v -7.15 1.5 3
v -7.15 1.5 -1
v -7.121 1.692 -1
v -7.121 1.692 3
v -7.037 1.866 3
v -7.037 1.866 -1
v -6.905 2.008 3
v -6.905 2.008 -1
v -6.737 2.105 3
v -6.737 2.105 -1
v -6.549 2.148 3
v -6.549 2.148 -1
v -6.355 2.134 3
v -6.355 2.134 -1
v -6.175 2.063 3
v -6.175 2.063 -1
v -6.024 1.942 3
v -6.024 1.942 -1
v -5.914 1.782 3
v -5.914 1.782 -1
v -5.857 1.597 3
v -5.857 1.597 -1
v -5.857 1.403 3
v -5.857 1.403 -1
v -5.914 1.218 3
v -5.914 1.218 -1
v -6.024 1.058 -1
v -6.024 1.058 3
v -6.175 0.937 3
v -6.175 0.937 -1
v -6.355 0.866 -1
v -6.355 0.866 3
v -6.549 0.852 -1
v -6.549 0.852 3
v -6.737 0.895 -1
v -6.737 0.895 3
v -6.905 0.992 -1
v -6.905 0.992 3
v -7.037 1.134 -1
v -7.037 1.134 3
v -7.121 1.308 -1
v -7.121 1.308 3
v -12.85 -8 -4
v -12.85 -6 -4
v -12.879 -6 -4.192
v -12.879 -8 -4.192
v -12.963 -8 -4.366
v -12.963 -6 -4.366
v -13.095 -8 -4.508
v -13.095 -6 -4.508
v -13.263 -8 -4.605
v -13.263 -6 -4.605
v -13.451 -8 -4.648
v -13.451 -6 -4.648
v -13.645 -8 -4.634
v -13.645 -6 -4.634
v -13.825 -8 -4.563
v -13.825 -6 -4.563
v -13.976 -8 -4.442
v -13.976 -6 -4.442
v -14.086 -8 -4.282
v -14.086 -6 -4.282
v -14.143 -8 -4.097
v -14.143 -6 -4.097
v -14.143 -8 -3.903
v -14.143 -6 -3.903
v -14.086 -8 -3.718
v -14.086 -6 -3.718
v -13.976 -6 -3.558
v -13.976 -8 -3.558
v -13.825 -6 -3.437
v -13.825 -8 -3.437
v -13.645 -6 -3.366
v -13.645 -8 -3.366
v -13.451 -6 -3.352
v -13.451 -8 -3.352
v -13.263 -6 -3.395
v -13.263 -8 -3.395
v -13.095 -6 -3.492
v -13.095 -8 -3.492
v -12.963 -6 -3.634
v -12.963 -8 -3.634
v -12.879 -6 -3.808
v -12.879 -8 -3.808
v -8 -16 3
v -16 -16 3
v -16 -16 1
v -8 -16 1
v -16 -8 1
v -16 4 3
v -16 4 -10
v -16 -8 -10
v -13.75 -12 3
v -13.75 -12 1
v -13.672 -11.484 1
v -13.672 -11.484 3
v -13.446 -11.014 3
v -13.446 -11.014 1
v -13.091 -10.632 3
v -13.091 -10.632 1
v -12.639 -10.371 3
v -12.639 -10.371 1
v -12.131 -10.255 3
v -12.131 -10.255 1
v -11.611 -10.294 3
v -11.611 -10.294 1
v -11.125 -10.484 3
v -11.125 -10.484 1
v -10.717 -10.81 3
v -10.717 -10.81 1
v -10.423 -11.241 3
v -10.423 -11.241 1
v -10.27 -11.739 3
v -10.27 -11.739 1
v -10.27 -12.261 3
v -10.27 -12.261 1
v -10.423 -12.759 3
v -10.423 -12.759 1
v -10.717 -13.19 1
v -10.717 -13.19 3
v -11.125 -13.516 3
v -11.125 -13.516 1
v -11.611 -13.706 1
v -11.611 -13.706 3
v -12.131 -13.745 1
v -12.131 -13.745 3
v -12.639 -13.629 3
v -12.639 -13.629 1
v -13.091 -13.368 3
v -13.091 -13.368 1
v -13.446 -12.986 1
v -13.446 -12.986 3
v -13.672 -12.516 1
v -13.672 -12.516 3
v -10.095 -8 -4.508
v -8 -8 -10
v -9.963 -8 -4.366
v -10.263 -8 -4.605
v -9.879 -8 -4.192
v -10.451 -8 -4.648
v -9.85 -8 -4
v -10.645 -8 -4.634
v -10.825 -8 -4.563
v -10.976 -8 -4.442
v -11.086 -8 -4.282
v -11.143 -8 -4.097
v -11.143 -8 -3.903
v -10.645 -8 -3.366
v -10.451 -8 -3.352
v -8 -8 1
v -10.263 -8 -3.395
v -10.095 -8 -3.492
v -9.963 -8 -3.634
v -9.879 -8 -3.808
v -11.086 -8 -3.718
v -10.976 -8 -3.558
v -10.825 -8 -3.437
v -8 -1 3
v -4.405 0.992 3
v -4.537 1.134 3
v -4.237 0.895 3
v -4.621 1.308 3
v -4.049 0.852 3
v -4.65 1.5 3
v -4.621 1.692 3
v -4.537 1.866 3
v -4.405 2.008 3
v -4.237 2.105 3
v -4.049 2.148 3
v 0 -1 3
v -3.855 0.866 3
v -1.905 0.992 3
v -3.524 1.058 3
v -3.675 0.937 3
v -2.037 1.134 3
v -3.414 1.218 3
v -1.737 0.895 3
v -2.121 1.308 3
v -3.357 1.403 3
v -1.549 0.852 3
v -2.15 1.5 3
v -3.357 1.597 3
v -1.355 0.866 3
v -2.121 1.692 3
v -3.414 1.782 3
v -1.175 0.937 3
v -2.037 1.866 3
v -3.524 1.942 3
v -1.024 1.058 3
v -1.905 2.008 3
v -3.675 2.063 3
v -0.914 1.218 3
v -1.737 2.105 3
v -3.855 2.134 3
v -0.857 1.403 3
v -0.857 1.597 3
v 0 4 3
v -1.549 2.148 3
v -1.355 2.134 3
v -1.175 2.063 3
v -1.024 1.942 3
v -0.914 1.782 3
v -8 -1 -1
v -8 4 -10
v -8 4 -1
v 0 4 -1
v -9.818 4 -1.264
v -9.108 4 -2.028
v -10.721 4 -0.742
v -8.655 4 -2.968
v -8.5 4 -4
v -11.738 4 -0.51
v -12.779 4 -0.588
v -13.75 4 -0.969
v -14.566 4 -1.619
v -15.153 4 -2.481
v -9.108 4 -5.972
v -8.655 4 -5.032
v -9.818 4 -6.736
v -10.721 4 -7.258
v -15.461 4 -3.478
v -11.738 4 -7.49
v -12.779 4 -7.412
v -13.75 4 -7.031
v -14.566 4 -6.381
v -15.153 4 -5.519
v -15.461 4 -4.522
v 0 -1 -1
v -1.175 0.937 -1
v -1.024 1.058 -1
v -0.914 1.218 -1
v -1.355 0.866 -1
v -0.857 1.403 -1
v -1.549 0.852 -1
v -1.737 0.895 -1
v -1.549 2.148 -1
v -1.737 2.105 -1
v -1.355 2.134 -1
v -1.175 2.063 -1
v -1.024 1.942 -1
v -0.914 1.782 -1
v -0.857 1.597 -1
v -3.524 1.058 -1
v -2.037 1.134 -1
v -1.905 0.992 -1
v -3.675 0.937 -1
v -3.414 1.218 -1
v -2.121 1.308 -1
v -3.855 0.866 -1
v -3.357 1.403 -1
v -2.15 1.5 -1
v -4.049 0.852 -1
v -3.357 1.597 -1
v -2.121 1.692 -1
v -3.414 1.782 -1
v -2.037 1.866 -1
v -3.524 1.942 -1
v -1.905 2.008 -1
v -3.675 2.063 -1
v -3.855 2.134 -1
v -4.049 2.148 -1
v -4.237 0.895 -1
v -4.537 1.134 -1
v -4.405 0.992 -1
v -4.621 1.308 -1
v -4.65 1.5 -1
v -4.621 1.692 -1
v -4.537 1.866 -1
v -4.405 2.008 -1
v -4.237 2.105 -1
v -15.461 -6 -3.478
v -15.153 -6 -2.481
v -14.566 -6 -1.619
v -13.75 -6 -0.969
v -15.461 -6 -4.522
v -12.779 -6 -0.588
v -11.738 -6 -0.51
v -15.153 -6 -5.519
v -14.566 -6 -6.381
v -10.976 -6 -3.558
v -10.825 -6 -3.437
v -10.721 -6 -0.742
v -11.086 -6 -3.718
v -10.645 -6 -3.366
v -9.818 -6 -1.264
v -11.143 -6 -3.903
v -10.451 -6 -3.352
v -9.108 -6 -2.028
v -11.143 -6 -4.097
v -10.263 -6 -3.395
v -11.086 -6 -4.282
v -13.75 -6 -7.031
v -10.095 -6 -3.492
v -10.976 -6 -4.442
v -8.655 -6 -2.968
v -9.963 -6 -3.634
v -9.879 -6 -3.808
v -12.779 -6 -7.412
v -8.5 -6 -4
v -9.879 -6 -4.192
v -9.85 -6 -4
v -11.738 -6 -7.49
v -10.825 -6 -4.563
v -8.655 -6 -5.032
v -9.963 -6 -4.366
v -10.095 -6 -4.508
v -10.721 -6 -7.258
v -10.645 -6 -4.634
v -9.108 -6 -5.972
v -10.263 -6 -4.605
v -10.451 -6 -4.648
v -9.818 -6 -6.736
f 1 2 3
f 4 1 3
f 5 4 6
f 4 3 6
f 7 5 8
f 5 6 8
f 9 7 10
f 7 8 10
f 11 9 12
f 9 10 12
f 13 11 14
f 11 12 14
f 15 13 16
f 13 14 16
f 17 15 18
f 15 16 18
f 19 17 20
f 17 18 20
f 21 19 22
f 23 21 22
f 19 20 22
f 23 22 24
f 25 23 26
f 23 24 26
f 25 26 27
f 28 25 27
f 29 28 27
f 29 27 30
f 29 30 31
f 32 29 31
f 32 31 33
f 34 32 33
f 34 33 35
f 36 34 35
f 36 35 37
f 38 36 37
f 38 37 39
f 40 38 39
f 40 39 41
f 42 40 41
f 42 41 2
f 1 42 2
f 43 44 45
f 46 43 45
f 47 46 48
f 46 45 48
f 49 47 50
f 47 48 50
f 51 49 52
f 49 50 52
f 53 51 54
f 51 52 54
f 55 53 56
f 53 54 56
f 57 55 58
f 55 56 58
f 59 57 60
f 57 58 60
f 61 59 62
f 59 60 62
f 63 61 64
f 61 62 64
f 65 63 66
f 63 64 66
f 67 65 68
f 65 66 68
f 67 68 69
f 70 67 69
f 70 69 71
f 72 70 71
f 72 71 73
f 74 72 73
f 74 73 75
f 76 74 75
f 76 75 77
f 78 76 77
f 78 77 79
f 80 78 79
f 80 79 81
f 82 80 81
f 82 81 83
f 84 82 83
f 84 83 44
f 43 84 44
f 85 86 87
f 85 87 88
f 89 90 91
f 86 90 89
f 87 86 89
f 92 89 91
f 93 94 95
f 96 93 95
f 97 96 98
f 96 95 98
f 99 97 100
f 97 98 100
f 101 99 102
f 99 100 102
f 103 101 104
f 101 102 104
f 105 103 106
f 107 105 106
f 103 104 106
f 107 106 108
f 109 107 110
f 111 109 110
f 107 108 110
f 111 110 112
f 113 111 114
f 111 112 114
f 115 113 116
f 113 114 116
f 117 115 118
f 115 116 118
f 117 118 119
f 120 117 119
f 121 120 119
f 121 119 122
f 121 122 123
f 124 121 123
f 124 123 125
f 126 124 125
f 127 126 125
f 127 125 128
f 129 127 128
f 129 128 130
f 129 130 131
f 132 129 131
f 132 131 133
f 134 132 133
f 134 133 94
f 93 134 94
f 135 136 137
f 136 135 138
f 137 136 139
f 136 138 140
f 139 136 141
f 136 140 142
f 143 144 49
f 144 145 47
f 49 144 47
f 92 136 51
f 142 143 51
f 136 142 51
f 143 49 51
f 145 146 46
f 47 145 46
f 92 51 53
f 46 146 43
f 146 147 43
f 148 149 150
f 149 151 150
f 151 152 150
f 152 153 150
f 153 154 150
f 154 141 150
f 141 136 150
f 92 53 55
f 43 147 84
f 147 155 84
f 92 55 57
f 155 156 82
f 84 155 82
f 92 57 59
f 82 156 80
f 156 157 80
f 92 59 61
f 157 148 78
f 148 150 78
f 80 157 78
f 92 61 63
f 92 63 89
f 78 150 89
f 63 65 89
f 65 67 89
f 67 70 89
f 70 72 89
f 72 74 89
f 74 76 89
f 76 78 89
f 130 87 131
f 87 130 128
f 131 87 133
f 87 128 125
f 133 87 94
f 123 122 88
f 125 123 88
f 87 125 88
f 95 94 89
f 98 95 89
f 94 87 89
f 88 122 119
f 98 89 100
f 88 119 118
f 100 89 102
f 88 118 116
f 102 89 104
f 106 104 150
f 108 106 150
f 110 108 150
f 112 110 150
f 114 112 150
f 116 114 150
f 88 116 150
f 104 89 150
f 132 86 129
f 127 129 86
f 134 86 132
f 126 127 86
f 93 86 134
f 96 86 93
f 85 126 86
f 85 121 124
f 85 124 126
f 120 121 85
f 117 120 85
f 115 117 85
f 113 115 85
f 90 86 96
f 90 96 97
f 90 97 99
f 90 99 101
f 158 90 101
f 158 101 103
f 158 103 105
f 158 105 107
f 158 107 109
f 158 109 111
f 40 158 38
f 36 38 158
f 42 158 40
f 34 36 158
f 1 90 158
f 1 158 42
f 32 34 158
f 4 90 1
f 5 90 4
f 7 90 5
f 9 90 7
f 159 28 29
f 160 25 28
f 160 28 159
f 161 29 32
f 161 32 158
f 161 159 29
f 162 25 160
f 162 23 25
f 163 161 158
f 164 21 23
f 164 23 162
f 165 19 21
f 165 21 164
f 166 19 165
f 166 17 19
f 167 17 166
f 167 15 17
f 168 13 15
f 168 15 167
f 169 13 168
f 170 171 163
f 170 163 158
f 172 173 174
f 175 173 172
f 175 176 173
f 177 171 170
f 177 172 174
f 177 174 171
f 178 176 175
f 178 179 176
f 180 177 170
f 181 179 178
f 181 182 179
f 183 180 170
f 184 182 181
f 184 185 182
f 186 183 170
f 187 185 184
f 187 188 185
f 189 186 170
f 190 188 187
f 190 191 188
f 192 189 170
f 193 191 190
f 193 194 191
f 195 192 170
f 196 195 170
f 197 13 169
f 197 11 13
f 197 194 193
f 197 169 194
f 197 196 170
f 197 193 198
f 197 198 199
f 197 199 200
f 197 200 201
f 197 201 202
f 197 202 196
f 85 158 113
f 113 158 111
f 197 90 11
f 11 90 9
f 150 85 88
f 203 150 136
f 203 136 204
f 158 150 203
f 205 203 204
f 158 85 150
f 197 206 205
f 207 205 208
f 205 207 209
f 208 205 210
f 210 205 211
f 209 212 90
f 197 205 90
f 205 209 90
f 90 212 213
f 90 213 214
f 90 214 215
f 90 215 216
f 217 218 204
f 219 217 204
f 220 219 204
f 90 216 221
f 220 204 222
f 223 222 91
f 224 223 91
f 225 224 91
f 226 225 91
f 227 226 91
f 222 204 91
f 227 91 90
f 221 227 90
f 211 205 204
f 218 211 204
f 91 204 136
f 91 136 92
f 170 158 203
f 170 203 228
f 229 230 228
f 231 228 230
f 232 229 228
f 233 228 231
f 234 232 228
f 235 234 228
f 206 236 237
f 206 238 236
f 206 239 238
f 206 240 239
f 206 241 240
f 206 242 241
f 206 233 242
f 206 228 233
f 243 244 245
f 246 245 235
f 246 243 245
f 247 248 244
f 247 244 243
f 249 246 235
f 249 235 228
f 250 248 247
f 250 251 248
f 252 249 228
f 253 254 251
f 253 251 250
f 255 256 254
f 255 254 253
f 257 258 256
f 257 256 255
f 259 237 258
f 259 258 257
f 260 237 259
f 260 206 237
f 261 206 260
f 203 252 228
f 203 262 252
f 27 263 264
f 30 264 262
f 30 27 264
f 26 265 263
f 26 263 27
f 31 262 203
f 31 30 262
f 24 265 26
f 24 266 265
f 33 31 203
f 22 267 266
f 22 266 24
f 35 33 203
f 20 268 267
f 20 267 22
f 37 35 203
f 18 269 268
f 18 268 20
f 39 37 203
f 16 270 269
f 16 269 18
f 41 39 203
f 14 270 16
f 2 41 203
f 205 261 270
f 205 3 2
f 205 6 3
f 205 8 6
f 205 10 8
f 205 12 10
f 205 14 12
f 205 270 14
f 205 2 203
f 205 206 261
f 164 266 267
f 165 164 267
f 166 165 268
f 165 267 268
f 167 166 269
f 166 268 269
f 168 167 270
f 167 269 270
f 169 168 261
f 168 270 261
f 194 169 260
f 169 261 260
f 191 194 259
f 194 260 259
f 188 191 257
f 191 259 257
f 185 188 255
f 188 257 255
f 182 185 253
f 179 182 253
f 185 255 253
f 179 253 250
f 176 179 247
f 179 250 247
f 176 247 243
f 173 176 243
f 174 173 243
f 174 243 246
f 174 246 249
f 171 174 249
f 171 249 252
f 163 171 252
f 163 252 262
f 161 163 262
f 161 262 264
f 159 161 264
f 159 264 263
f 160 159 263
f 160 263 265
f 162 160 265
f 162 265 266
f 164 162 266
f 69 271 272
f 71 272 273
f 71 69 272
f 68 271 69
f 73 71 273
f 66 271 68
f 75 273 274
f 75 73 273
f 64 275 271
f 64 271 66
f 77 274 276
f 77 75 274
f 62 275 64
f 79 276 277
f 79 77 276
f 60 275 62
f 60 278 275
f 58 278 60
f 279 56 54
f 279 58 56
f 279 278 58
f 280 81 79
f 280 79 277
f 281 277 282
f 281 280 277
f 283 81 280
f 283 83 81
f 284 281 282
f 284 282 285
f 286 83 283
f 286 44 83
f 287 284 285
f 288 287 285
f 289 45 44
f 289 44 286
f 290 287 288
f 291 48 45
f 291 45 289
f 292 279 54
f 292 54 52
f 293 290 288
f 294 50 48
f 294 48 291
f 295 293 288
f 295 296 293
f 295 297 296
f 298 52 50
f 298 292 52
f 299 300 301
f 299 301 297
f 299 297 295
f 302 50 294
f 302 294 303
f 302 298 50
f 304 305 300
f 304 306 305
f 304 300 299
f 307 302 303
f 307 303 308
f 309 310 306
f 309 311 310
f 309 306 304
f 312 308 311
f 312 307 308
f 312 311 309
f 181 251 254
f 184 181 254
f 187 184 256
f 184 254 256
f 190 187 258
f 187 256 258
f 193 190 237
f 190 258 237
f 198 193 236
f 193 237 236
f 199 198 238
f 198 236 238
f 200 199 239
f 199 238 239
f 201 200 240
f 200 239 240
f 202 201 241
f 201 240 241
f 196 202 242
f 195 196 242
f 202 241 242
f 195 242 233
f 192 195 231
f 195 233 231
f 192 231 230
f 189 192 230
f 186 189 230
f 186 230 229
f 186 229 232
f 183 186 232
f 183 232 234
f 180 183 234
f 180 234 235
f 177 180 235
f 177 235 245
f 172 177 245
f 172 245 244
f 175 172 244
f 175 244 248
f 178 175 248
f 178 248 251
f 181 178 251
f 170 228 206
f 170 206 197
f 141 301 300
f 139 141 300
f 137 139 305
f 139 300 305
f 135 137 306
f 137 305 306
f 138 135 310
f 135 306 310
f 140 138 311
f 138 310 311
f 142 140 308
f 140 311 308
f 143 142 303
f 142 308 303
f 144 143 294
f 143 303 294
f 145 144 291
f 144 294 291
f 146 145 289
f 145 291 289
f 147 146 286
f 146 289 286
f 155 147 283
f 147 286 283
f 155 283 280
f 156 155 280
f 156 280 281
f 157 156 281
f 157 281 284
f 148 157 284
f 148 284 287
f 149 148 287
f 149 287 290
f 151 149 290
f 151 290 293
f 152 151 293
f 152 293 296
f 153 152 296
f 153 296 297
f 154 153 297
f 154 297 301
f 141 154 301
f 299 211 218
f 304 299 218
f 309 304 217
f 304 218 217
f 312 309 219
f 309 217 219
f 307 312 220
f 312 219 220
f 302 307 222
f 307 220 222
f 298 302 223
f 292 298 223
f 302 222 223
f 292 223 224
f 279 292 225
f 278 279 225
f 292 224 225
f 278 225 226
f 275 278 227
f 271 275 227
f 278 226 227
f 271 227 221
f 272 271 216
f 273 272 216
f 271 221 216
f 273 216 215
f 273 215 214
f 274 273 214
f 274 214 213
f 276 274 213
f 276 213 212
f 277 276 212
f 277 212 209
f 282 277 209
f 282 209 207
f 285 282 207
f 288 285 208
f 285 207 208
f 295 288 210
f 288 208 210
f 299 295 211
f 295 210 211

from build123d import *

# Parameters (mm, degrees)
BOSS_EXTRUDE1_DEPTH  = 2
SKETCH2_W            = 8
SKETCH2_H            = 8
BOSS_EXTRUDE2_DEPTH  = 2
SKETCH3_W            = 8
SKETCH3_H            = 8
BOSS_EXTRUDE3_DEPTH  = 8
SKETCH4_R            = 3.5
CUT_EXTRUDE1_DEPTH   = 10
CUT_EXTRUDE2_REACH   = 4
SKETCH5_R            = 0.65
CUT_EXTRUDE3_REACH   = 3
SKETCH6_R            = 0.65
SKETCH10_R           = 0.65
BOSS_EXTRUDE6_DEPTH  = 3
SKETCH11_W           = 8
SKETCH11_H           = 2
BOSS_EXTRUDE7_DEPTH  = 8
SKETCH12_R           = 1
CUT_EXTRUDE5_DEPTH   = 8
SKETCH13_W           = 8
SKETCH13_H           = 12
BOSS_EXTRUDE8_DEPTH  = 2
SKETCH14_W           = 8
SKETCH14_H           = 4
BOSS_EXTRUDE9_DEPTH  = 1
BOSS_EXTRUDE10_DEPTH = 2
SKETCH18_R           = 0.65
BOSS_EXTRUDE11_DEPTH = 4
CUT_EXTRUDE6_REACH   = 6
SKETCH19_R           = 0.65
CUT_EXTRUDE7_REACH   = 4
SKETCH20_R           = 1.75


with BuildPart() as part:
    # Sketch1 → Boss-Extrude1 (new body)
    with BuildSketch(Plane(origin=(0, 0, 0), x_dir=(1, 0, 0), z_dir=(0, 1, 0))):
        Polygon((-16, 0), (0, 0), (0, 1), (-8, 1), (-8, 8), (-16, 8), align=None)
    extrude(amount=BOSS_EXTRUDE1_DEPTH)

    # Sketch2 → Boss-Extrude2 (add)
    with BuildSketch(Plane(origin=(0, 2, 0), x_dir=(1, 0, 0), z_dir=(0, 1, 0))):
        with Locations((-12, 4)):
            Rectangle(SKETCH2_W, SKETCH2_H)
    extrude(amount=BOSS_EXTRUDE2_DEPTH)

    # Sketch3 → Boss-Extrude3 (add)
    with BuildSketch(Plane.XZ):
        with Locations((-12, -4)):
            Rectangle(SKETCH3_W, SKETCH3_H)
    extrude(amount=BOSS_EXTRUDE3_DEPTH)

    # Sketch4 → Cut-Extrude1 (cut)
    with BuildSketch(Plane(origin=(0, 4, 0), x_dir=(1, 0, 0), z_dir=(0, 1, 0))):
        with Locations((-12, 4)):
            Circle(SKETCH4_R)
    extrude(amount=-CUT_EXTRUDE1_DEPTH, mode=Mode.SUBTRACT)

    # Sketch5 → Cut-Extrude2 (cut, up to next)
    with BuildSketch(Plane(origin=(0, -6, 0), x_dir=(1, 0, 0), z_dir=(0, 1, 0)), mode=Mode.PRIVATE) as cut_extrude2_sk1:
        with Locations((-13.5, 4)):
            Circle(SKETCH5_R)
    cut_extrude2_tool1 = extrude(cut_extrude2_sk1.sketch, amount=-CUT_EXTRUDE2_REACH, mode=Mode.PRIVATE) & part.part
    add(cut_extrude2_tool1.solids().sort_by_distance((-13.5, -6, -4))[0], mode=Mode.SUBTRACT)
    # Sketch5 → Cut-Extrude2 (cut, up to next)
    with BuildSketch(Plane(origin=(0, -6, 0), x_dir=(1, 0, 0), z_dir=(0, 1, 0)), mode=Mode.PRIVATE) as cut_extrude2_sk2:
        with Locations((-10.5, 4)):
            Circle(SKETCH5_R)
    cut_extrude2_tool2 = extrude(cut_extrude2_sk2.sketch, amount=-CUT_EXTRUDE2_REACH, mode=Mode.PRIVATE) & part.part
    add(cut_extrude2_tool2.solids().sort_by_distance((-10.5, -6, -4))[0], mode=Mode.SUBTRACT)

    # Sketch6 → Cut-Extrude3 (cut, up to next)
    with BuildSketch(Plane(origin=(0, 0, -1), x_dir=(-1, 0, 0), z_dir=(0, 0, -1)), mode=Mode.PRIVATE) as cut_extrude3_sk1:
        with Locations((6.5, 1)):
            Circle(SKETCH6_R)
    cut_extrude3_tool1 = extrude(cut_extrude3_sk1.sketch, amount=-CUT_EXTRUDE3_REACH, mode=Mode.PRIVATE) & part.part
    add(cut_extrude3_tool1.solids().sort_by_distance((-6.5, 1, -1))[0], mode=Mode.SUBTRACT)
    # Sketch6 → Cut-Extrude3 (cut, up to next)
    with BuildSketch(Plane(origin=(0, 0, -1), x_dir=(-1, 0, 0), z_dir=(0, 0, -1)), mode=Mode.PRIVATE) as cut_extrude3_sk2:
        with Locations((4, 1)):
            Circle(SKETCH6_R)
    cut_extrude3_tool2 = extrude(cut_extrude3_sk2.sketch, amount=-CUT_EXTRUDE3_REACH, mode=Mode.PRIVATE) & part.part
    add(cut_extrude3_tool2.solids().sort_by_distance((-4, 1, -1))[0], mode=Mode.SUBTRACT)
    # Sketch6 → Cut-Extrude3 (cut, up to next)
    with BuildSketch(Plane(origin=(0, 0, -1), x_dir=(-1, 0, 0), z_dir=(0, 0, -1)), mode=Mode.PRIVATE) as cut_extrude3_sk3:
        with Locations((1.5, 1)):
            Circle(SKETCH6_R)
    cut_extrude3_tool3 = extrude(cut_extrude3_sk3.sketch, amount=-CUT_EXTRUDE3_REACH, mode=Mode.PRIVATE) & part.part
    add(cut_extrude3_tool3.solids().sort_by_distance((-1.5, 1, -1))[0], mode=Mode.SUBTRACT)

    # Sketch10 → Boss-Extrude6 (add)
    with BuildSketch(Plane.XY):
        Polygon((-8, 2), (-16, 2), (-16, -8), (-8, -8), (-8, 0), (0, 0), (0, 2), align=None)
        with Locations((-1.5, 1)):
            Circle(SKETCH10_R, mode=Mode.SUBTRACT)
        with Locations((-4, 1)):
            Circle(SKETCH10_R, mode=Mode.SUBTRACT)
        with Locations((-6.5, 1)):
            Circle(SKETCH10_R, mode=Mode.SUBTRACT)
    extrude(amount=BOSS_EXTRUDE6_DEPTH)

    # Sketch11 → Boss-Extrude7 (add)
    with BuildSketch(Plane.XZ.offset(8)):
        with Locations((-12, 2)):
            Rectangle(SKETCH11_W, SKETCH11_H)
    extrude(amount=BOSS_EXTRUDE7_DEPTH)

    # Sketch12 → Cut-Extrude5 (cut)
    with BuildSketch(Plane(origin=(0, 0, 1), x_dir=(-1, 0, 0), z_dir=(0, 0, -1))):
        with Locations((12, -12)):
            Circle(SKETCH12_R)
    extrude(amount=-CUT_EXTRUDE5_DEPTH, mode=Mode.SUBTRACT)

    # Sketch13 → Boss-Extrude8 (add)
    with BuildSketch(Plane(origin=(0, 0, -8), x_dir=(-1, 0, 0), z_dir=(0, 0, -1))):
        with Locations((12, -2)):
            Rectangle(SKETCH13_W, SKETCH13_H)
    extrude(amount=BOSS_EXTRUDE8_DEPTH)

    # Sketch14 → Boss-Extrude9 (add)
    with BuildSketch(Plane.XZ):
        with Locations((-4, 1)):
            Rectangle(SKETCH14_W, SKETCH14_H)
    extrude(amount=BOSS_EXTRUDE9_DEPTH)

    # Sketch15 → Boss-Extrude10 (add)
    with BuildSketch(Plane(origin=(0, 2, 0), x_dir=(1, 0, 0), z_dir=(0, 1, 0))):
        Polygon((-8, 0), (-8, 1), (0, 1), (0, -3), (-16, -3), (-16, 0), align=None)
    extrude(amount=BOSS_EXTRUDE10_DEPTH)

    # Sketch18 → Boss-Extrude11 (add)
    with BuildSketch(Plane(origin=(0, 0, -1), x_dir=(-1, 0, 0), z_dir=(0, 0, -1))):
        with Locations((1.5, 1)):
            Circle(SKETCH18_R)
        with Locations((4, 1)):
            Circle(SKETCH18_R)
        with Locations((6.5, 1)):
            Circle(SKETCH18_R)
    extrude(amount=-BOSS_EXTRUDE11_DEPTH)

    # Sketch19 → Cut-Extrude6 (cut, up to next)
    with BuildSketch(Plane(origin=(0, 0, -1), x_dir=(-1, 0, 0), z_dir=(0, 0, -1)), mode=Mode.PRIVATE) as cut_extrude6_sk1:
        with Locations((1.5, 1.5)):
            Circle(SKETCH19_R)
    cut_extrude6_tool1 = extrude(cut_extrude6_sk1.sketch, amount=-CUT_EXTRUDE6_REACH, mode=Mode.PRIVATE) & part.part
    add(cut_extrude6_tool1.solids().sort_by_distance((-1.5, 1.5, -1))[0], mode=Mode.SUBTRACT)
    # Sketch19 → Cut-Extrude6 (cut, up to next)
    with BuildSketch(Plane(origin=(0, 0, -1), x_dir=(-1, 0, 0), z_dir=(0, 0, -1)), mode=Mode.PRIVATE) as cut_extrude6_sk2:
        with Locations((4, 1.5)):
            Circle(SKETCH19_R)
    cut_extrude6_tool2 = extrude(cut_extrude6_sk2.sketch, amount=-CUT_EXTRUDE6_REACH, mode=Mode.PRIVATE) & part.part
    add(cut_extrude6_tool2.solids().sort_by_distance((-4, 1.5, -1))[0], mode=Mode.SUBTRACT)
    # Sketch19 → Cut-Extrude6 (cut, up to next)
    with BuildSketch(Plane(origin=(0, 0, -1), x_dir=(-1, 0, 0), z_dir=(0, 0, -1)), mode=Mode.PRIVATE) as cut_extrude6_sk3:
        with Locations((6.5, 1.5)):
            Circle(SKETCH19_R)
    cut_extrude6_tool3 = extrude(cut_extrude6_sk3.sketch, amount=-CUT_EXTRUDE6_REACH, mode=Mode.PRIVATE) & part.part
    add(cut_extrude6_tool3.solids().sort_by_distance((-6.5, 1.5, -1))[0], mode=Mode.SUBTRACT)

    # Sketch20 → Cut-Extrude7 (cut, up to next)
    with BuildSketch(Plane(origin=(0, 0, 1), x_dir=(-1, 0, 0), z_dir=(0, 0, -1)), mode=Mode.PRIVATE) as cut_extrude7_sk1:
        with Locations((12, -12)):
            Circle(SKETCH20_R)
    cut_extrude7_tool1 = extrude(cut_extrude7_sk1.sketch, amount=-CUT_EXTRUDE7_REACH, mode=Mode.PRIVATE) & part.part
    add(cut_extrude7_tool1.solids().sort_by_distance((-12, -12, 1))[0], mode=Mode.SUBTRACT)


solid = part.part
